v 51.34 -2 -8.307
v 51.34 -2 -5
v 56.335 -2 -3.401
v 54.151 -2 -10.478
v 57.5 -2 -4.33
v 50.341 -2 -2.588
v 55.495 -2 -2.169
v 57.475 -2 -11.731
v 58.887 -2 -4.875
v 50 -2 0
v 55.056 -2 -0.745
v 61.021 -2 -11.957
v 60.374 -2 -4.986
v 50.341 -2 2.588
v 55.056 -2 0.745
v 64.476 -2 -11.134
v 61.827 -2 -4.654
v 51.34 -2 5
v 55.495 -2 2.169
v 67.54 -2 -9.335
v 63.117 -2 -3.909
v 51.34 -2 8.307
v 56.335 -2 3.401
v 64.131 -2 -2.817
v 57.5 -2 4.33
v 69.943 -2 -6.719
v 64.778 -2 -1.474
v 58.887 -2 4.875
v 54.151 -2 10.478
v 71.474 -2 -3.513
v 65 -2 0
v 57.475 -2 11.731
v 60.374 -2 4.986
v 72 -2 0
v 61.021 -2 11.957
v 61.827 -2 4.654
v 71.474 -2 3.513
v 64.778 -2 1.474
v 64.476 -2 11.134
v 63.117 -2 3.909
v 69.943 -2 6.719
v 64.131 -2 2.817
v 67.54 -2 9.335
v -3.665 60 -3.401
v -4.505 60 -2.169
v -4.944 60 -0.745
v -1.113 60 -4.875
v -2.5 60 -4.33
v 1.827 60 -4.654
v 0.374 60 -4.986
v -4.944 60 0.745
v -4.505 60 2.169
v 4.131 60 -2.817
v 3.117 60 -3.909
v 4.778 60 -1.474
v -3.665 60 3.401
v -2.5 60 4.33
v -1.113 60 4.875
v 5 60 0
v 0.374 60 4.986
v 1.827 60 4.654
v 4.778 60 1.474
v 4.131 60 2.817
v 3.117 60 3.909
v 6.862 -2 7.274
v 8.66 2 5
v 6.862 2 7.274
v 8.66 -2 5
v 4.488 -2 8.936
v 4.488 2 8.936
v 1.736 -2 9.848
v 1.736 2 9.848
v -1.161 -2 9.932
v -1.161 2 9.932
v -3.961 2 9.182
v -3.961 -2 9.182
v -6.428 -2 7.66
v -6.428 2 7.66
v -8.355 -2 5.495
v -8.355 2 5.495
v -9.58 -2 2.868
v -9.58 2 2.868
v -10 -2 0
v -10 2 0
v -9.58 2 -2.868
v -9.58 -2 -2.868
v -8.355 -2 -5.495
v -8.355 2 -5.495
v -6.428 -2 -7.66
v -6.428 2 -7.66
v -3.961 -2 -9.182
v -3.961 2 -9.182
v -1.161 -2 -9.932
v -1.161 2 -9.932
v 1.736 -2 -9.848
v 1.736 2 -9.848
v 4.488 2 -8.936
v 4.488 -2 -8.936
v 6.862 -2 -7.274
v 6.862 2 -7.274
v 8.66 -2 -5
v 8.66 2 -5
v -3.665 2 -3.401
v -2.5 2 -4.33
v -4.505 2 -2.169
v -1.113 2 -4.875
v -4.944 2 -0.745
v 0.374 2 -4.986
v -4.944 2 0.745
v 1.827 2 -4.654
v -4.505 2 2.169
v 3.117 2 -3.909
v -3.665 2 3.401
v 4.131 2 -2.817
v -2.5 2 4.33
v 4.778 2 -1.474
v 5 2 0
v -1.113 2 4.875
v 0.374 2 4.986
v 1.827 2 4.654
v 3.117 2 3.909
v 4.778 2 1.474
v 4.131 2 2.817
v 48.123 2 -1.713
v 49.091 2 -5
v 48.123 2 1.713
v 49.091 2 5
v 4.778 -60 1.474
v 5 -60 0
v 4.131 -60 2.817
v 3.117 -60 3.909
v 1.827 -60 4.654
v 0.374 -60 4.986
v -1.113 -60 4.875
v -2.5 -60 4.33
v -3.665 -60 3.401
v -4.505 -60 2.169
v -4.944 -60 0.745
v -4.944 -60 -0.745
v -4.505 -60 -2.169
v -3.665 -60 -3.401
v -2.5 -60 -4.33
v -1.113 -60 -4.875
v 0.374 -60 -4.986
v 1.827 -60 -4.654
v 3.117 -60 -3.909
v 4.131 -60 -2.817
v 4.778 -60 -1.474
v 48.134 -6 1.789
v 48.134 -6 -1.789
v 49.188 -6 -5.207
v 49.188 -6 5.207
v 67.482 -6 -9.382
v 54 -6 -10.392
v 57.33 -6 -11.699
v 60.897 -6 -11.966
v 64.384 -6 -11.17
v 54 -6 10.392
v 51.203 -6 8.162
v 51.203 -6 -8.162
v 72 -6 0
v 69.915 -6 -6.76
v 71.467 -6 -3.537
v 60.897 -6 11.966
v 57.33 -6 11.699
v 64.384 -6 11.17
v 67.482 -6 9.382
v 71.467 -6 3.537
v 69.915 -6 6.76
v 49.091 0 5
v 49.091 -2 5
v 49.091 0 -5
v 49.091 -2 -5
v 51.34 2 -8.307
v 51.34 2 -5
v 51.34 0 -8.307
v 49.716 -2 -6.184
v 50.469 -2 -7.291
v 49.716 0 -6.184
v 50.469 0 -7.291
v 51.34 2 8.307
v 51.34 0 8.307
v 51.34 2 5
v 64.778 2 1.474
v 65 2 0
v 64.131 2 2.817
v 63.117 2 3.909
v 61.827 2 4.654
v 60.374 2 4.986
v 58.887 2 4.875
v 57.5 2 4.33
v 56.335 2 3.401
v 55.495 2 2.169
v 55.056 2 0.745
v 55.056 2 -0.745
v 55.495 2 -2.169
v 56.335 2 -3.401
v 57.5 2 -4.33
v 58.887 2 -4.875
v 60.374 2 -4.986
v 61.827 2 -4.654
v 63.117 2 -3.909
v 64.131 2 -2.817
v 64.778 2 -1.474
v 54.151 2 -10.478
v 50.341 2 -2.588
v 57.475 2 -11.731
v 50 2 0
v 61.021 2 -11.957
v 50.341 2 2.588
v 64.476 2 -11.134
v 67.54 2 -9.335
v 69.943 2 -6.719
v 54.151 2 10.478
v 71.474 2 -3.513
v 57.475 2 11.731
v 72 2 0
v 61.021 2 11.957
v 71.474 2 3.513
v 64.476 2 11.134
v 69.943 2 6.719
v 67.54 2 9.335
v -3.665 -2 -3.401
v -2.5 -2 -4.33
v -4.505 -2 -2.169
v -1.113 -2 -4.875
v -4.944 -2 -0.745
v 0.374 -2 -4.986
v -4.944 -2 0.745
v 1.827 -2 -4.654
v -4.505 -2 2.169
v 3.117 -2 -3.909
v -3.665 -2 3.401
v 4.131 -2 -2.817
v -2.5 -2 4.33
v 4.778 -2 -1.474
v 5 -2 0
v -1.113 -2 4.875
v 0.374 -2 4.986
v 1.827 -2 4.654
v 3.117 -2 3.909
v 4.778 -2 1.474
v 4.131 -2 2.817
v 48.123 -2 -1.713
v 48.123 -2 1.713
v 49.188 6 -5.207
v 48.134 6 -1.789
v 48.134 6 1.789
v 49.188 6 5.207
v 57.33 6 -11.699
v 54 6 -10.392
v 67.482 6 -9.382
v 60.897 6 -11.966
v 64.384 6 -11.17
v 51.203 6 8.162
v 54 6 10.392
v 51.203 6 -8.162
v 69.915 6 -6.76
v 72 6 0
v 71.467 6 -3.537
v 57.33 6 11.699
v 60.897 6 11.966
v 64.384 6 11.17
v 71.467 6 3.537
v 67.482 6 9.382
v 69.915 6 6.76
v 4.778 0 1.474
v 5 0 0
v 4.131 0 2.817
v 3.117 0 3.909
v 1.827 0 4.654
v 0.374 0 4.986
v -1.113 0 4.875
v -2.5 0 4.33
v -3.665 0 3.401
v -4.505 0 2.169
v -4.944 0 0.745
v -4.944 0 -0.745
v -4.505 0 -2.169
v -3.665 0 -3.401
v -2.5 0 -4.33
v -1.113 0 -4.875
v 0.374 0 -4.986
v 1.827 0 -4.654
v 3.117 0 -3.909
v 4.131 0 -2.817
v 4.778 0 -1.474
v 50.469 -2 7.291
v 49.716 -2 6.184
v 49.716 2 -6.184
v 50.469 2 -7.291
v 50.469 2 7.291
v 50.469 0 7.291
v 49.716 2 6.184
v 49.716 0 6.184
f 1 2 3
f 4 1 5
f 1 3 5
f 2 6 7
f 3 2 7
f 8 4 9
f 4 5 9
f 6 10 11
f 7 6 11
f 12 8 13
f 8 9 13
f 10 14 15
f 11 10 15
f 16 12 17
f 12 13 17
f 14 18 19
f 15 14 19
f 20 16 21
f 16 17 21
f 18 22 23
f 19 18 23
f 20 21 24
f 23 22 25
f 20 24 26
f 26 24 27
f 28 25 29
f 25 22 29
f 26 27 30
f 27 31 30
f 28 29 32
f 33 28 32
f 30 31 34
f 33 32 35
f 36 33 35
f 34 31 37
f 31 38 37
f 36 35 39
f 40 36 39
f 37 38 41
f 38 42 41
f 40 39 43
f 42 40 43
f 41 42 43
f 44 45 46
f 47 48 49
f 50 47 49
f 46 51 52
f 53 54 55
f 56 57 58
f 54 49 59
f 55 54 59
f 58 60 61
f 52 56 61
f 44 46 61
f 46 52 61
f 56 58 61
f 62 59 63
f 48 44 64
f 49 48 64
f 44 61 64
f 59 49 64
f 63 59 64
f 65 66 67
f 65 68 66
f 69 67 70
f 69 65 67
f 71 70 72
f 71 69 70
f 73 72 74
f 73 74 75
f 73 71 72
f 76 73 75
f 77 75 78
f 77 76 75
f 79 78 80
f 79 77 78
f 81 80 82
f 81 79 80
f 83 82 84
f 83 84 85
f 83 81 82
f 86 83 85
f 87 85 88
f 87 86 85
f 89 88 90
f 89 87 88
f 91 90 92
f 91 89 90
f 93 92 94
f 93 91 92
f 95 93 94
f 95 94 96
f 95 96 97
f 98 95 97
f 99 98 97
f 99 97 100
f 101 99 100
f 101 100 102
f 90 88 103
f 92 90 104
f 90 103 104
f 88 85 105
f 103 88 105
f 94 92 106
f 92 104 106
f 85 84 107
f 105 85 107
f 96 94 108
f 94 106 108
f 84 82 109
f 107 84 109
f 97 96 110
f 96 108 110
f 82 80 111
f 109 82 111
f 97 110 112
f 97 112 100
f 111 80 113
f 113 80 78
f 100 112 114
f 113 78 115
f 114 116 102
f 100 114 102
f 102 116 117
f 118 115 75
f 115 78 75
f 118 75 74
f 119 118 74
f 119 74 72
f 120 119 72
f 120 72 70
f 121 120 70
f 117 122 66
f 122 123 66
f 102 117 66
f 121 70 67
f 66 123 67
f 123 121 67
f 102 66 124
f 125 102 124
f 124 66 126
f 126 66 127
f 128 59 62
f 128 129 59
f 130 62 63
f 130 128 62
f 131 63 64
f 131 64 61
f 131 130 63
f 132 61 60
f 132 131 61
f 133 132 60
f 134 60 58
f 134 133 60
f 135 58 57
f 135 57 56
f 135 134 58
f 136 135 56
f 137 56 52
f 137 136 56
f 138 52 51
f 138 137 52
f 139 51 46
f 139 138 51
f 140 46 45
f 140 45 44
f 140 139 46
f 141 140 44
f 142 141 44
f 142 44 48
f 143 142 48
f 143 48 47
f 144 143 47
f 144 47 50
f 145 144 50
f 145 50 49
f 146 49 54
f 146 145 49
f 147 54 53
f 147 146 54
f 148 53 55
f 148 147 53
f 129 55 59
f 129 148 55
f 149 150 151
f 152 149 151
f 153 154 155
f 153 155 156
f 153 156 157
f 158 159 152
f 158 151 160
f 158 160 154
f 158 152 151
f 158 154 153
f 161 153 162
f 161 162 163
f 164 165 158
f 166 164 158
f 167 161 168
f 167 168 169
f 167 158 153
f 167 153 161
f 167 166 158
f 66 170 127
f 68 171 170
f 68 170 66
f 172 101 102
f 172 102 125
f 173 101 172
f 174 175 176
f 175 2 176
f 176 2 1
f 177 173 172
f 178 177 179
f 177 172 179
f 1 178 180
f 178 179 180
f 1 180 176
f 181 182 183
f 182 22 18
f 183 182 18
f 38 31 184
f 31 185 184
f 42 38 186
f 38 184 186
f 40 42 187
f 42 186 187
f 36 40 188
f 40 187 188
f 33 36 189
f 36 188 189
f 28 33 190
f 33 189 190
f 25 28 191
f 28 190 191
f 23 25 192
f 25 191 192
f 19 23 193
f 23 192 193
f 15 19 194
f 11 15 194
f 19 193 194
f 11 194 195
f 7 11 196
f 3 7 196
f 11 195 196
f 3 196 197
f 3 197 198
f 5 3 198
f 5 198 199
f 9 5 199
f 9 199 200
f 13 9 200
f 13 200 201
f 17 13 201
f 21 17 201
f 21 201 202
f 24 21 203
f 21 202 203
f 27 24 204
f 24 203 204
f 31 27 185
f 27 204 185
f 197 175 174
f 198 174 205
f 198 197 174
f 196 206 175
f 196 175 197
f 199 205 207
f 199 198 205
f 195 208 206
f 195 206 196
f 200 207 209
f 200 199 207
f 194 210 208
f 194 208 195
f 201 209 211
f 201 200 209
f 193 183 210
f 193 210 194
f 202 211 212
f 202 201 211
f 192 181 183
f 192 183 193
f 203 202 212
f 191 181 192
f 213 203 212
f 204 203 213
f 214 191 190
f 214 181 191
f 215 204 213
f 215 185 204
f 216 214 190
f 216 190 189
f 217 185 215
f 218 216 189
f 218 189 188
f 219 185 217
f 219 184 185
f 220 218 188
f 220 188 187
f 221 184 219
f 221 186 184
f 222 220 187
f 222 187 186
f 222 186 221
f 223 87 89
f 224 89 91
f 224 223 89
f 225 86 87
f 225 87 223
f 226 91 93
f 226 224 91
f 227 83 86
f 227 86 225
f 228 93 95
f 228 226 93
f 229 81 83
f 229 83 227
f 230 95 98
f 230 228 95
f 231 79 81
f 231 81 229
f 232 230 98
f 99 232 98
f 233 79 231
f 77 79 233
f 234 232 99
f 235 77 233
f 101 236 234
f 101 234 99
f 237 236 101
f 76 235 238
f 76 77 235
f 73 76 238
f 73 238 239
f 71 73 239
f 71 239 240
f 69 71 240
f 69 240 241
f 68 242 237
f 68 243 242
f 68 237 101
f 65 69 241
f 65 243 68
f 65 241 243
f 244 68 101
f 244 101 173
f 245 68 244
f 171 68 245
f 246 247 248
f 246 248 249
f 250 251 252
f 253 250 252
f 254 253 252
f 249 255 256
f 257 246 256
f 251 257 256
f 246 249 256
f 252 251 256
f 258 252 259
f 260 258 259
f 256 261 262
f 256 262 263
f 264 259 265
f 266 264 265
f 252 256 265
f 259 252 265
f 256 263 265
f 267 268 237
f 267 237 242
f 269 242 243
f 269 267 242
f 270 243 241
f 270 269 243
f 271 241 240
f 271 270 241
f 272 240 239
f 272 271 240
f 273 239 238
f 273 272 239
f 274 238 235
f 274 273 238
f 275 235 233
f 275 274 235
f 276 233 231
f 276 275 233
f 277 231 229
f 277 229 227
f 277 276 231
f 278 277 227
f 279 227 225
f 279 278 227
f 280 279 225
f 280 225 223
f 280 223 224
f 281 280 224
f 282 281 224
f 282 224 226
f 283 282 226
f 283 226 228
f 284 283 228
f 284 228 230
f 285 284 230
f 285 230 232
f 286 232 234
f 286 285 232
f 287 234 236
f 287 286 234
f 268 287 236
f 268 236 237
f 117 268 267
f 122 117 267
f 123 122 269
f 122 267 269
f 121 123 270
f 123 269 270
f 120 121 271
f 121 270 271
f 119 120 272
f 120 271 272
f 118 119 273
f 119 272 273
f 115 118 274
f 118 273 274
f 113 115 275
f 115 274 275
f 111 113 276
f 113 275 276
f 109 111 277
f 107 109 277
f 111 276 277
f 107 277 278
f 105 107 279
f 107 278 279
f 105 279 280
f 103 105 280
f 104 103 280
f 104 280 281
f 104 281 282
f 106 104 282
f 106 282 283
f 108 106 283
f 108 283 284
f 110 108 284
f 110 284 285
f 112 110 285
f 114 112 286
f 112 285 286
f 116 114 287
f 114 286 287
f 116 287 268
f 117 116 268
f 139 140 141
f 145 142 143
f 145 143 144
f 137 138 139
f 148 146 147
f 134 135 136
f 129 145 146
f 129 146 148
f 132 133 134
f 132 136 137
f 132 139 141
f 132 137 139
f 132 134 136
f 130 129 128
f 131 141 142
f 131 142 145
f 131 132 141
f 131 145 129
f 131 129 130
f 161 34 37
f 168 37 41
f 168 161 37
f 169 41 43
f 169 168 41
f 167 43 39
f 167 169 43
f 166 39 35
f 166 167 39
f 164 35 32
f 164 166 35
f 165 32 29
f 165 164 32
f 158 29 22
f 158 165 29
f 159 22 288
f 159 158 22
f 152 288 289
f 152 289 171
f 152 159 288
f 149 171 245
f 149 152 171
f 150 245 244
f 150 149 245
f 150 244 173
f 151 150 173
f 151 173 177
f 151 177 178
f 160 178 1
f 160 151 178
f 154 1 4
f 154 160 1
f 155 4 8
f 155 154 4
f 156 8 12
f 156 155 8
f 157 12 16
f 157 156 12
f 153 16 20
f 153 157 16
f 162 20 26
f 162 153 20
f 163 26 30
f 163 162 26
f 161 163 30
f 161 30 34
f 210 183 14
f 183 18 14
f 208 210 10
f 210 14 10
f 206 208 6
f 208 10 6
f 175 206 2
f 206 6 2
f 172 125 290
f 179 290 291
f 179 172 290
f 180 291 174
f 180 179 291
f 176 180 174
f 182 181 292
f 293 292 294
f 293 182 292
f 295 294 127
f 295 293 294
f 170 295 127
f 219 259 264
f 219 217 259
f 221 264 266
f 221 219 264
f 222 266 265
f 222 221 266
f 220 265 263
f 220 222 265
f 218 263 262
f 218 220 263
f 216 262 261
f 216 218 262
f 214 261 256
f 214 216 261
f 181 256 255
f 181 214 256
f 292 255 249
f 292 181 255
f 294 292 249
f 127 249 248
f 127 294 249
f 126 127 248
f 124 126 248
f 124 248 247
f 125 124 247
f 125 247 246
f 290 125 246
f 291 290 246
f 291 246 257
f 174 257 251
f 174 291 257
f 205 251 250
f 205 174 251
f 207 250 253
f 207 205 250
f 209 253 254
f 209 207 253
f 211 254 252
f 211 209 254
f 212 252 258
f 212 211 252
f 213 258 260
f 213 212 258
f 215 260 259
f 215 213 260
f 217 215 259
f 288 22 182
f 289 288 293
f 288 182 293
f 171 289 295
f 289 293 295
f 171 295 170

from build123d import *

# Parameters (mm, degrees)
F0_R     = 5
F1_DEPTH = 60
F2_R     = 5
F3_DEPTH = 2
F4_R     = 12
F5_DEPTH = 6
F6_R     = 5
F7_DEPTH = 2


with BuildPart() as f1:
    # F0 (on Front) → F1 (new body, symmetric)
    with BuildSketch(Plane.XZ):
        Circle(F0_R)
    extrude(amount=F1_DEPTH, both=True)


with BuildPart() as f3:
    # F2 (on Front) → F3 (new body, symmetric)
    with BuildSketch(Plane.XZ):
        with BuildLine():
            ThreePointArc((8.660254, -5), (9.659258, -2.58819), (10, 0))
            ThreePointArc((10, 0), (9.659258, 2.58819), (8.660254, 5))
            ThreePointArc((8.660254, 5), (-10, 0), (8.660254, -5))
        make_face()
        Circle(F2_R, mode=Mode.SUBTRACT)
        with BuildLine():
            ThreePointArc((8.660254, 5), (9.659258, 2.58819), (10, 0))
            ThreePointArc((10, 0), (9.659258, -2.58819), (8.660254, -5))
            Line((8.660254, -5), (49.091288, -5))
            ThreePointArc((49.091288, -5), (48, 0), (49.091288, 5))
            Line((49.091288, 5), (8.660254, 5))
        make_face()
        with BuildLine():
            ThreePointArc((72, 0), (62.558853, 11.724004), (49.091288, 5))
            ThreePointArc((49.091288, 5), (48, 0), (49.091288, -5))
            ThreePointArc((49.091288, -5), (62.558853, -11.724004), (72, 0))
        make_face()
    extrude(amount=F3_DEPTH, both=True)

    # F4 (on Front) → F5 (join, symmetric)
    with BuildSketch(Plane.XZ):
        with Locations((60, 0)):
            Circle(F4_R)
    extrude(amount=F5_DEPTH, both=True)

    # F6 (on Front) → F7 (cut, symmetric)
    with BuildSketch(Plane.XZ):
        with BuildLine():
            Line((51.339746, -5), (51.339746, -8.306624))
            ThreePointArc((51.339746, -8.306624), (72, 0), (51.339746, 8.306624))
            Line((51.339746, 8.306624), (51.339746, 5))
            ThreePointArc((51.339746, 5), (50, 0), (51.339746, -5))
        make_face()
        with Locations((60, 0)):
            Circle(F6_R, mode=Mode.SUBTRACT)
    extrude(amount=F7_DEPTH, both=True, mode=Mode.SUBTRACT)


solid = Compound([f1.part, f3.part])
